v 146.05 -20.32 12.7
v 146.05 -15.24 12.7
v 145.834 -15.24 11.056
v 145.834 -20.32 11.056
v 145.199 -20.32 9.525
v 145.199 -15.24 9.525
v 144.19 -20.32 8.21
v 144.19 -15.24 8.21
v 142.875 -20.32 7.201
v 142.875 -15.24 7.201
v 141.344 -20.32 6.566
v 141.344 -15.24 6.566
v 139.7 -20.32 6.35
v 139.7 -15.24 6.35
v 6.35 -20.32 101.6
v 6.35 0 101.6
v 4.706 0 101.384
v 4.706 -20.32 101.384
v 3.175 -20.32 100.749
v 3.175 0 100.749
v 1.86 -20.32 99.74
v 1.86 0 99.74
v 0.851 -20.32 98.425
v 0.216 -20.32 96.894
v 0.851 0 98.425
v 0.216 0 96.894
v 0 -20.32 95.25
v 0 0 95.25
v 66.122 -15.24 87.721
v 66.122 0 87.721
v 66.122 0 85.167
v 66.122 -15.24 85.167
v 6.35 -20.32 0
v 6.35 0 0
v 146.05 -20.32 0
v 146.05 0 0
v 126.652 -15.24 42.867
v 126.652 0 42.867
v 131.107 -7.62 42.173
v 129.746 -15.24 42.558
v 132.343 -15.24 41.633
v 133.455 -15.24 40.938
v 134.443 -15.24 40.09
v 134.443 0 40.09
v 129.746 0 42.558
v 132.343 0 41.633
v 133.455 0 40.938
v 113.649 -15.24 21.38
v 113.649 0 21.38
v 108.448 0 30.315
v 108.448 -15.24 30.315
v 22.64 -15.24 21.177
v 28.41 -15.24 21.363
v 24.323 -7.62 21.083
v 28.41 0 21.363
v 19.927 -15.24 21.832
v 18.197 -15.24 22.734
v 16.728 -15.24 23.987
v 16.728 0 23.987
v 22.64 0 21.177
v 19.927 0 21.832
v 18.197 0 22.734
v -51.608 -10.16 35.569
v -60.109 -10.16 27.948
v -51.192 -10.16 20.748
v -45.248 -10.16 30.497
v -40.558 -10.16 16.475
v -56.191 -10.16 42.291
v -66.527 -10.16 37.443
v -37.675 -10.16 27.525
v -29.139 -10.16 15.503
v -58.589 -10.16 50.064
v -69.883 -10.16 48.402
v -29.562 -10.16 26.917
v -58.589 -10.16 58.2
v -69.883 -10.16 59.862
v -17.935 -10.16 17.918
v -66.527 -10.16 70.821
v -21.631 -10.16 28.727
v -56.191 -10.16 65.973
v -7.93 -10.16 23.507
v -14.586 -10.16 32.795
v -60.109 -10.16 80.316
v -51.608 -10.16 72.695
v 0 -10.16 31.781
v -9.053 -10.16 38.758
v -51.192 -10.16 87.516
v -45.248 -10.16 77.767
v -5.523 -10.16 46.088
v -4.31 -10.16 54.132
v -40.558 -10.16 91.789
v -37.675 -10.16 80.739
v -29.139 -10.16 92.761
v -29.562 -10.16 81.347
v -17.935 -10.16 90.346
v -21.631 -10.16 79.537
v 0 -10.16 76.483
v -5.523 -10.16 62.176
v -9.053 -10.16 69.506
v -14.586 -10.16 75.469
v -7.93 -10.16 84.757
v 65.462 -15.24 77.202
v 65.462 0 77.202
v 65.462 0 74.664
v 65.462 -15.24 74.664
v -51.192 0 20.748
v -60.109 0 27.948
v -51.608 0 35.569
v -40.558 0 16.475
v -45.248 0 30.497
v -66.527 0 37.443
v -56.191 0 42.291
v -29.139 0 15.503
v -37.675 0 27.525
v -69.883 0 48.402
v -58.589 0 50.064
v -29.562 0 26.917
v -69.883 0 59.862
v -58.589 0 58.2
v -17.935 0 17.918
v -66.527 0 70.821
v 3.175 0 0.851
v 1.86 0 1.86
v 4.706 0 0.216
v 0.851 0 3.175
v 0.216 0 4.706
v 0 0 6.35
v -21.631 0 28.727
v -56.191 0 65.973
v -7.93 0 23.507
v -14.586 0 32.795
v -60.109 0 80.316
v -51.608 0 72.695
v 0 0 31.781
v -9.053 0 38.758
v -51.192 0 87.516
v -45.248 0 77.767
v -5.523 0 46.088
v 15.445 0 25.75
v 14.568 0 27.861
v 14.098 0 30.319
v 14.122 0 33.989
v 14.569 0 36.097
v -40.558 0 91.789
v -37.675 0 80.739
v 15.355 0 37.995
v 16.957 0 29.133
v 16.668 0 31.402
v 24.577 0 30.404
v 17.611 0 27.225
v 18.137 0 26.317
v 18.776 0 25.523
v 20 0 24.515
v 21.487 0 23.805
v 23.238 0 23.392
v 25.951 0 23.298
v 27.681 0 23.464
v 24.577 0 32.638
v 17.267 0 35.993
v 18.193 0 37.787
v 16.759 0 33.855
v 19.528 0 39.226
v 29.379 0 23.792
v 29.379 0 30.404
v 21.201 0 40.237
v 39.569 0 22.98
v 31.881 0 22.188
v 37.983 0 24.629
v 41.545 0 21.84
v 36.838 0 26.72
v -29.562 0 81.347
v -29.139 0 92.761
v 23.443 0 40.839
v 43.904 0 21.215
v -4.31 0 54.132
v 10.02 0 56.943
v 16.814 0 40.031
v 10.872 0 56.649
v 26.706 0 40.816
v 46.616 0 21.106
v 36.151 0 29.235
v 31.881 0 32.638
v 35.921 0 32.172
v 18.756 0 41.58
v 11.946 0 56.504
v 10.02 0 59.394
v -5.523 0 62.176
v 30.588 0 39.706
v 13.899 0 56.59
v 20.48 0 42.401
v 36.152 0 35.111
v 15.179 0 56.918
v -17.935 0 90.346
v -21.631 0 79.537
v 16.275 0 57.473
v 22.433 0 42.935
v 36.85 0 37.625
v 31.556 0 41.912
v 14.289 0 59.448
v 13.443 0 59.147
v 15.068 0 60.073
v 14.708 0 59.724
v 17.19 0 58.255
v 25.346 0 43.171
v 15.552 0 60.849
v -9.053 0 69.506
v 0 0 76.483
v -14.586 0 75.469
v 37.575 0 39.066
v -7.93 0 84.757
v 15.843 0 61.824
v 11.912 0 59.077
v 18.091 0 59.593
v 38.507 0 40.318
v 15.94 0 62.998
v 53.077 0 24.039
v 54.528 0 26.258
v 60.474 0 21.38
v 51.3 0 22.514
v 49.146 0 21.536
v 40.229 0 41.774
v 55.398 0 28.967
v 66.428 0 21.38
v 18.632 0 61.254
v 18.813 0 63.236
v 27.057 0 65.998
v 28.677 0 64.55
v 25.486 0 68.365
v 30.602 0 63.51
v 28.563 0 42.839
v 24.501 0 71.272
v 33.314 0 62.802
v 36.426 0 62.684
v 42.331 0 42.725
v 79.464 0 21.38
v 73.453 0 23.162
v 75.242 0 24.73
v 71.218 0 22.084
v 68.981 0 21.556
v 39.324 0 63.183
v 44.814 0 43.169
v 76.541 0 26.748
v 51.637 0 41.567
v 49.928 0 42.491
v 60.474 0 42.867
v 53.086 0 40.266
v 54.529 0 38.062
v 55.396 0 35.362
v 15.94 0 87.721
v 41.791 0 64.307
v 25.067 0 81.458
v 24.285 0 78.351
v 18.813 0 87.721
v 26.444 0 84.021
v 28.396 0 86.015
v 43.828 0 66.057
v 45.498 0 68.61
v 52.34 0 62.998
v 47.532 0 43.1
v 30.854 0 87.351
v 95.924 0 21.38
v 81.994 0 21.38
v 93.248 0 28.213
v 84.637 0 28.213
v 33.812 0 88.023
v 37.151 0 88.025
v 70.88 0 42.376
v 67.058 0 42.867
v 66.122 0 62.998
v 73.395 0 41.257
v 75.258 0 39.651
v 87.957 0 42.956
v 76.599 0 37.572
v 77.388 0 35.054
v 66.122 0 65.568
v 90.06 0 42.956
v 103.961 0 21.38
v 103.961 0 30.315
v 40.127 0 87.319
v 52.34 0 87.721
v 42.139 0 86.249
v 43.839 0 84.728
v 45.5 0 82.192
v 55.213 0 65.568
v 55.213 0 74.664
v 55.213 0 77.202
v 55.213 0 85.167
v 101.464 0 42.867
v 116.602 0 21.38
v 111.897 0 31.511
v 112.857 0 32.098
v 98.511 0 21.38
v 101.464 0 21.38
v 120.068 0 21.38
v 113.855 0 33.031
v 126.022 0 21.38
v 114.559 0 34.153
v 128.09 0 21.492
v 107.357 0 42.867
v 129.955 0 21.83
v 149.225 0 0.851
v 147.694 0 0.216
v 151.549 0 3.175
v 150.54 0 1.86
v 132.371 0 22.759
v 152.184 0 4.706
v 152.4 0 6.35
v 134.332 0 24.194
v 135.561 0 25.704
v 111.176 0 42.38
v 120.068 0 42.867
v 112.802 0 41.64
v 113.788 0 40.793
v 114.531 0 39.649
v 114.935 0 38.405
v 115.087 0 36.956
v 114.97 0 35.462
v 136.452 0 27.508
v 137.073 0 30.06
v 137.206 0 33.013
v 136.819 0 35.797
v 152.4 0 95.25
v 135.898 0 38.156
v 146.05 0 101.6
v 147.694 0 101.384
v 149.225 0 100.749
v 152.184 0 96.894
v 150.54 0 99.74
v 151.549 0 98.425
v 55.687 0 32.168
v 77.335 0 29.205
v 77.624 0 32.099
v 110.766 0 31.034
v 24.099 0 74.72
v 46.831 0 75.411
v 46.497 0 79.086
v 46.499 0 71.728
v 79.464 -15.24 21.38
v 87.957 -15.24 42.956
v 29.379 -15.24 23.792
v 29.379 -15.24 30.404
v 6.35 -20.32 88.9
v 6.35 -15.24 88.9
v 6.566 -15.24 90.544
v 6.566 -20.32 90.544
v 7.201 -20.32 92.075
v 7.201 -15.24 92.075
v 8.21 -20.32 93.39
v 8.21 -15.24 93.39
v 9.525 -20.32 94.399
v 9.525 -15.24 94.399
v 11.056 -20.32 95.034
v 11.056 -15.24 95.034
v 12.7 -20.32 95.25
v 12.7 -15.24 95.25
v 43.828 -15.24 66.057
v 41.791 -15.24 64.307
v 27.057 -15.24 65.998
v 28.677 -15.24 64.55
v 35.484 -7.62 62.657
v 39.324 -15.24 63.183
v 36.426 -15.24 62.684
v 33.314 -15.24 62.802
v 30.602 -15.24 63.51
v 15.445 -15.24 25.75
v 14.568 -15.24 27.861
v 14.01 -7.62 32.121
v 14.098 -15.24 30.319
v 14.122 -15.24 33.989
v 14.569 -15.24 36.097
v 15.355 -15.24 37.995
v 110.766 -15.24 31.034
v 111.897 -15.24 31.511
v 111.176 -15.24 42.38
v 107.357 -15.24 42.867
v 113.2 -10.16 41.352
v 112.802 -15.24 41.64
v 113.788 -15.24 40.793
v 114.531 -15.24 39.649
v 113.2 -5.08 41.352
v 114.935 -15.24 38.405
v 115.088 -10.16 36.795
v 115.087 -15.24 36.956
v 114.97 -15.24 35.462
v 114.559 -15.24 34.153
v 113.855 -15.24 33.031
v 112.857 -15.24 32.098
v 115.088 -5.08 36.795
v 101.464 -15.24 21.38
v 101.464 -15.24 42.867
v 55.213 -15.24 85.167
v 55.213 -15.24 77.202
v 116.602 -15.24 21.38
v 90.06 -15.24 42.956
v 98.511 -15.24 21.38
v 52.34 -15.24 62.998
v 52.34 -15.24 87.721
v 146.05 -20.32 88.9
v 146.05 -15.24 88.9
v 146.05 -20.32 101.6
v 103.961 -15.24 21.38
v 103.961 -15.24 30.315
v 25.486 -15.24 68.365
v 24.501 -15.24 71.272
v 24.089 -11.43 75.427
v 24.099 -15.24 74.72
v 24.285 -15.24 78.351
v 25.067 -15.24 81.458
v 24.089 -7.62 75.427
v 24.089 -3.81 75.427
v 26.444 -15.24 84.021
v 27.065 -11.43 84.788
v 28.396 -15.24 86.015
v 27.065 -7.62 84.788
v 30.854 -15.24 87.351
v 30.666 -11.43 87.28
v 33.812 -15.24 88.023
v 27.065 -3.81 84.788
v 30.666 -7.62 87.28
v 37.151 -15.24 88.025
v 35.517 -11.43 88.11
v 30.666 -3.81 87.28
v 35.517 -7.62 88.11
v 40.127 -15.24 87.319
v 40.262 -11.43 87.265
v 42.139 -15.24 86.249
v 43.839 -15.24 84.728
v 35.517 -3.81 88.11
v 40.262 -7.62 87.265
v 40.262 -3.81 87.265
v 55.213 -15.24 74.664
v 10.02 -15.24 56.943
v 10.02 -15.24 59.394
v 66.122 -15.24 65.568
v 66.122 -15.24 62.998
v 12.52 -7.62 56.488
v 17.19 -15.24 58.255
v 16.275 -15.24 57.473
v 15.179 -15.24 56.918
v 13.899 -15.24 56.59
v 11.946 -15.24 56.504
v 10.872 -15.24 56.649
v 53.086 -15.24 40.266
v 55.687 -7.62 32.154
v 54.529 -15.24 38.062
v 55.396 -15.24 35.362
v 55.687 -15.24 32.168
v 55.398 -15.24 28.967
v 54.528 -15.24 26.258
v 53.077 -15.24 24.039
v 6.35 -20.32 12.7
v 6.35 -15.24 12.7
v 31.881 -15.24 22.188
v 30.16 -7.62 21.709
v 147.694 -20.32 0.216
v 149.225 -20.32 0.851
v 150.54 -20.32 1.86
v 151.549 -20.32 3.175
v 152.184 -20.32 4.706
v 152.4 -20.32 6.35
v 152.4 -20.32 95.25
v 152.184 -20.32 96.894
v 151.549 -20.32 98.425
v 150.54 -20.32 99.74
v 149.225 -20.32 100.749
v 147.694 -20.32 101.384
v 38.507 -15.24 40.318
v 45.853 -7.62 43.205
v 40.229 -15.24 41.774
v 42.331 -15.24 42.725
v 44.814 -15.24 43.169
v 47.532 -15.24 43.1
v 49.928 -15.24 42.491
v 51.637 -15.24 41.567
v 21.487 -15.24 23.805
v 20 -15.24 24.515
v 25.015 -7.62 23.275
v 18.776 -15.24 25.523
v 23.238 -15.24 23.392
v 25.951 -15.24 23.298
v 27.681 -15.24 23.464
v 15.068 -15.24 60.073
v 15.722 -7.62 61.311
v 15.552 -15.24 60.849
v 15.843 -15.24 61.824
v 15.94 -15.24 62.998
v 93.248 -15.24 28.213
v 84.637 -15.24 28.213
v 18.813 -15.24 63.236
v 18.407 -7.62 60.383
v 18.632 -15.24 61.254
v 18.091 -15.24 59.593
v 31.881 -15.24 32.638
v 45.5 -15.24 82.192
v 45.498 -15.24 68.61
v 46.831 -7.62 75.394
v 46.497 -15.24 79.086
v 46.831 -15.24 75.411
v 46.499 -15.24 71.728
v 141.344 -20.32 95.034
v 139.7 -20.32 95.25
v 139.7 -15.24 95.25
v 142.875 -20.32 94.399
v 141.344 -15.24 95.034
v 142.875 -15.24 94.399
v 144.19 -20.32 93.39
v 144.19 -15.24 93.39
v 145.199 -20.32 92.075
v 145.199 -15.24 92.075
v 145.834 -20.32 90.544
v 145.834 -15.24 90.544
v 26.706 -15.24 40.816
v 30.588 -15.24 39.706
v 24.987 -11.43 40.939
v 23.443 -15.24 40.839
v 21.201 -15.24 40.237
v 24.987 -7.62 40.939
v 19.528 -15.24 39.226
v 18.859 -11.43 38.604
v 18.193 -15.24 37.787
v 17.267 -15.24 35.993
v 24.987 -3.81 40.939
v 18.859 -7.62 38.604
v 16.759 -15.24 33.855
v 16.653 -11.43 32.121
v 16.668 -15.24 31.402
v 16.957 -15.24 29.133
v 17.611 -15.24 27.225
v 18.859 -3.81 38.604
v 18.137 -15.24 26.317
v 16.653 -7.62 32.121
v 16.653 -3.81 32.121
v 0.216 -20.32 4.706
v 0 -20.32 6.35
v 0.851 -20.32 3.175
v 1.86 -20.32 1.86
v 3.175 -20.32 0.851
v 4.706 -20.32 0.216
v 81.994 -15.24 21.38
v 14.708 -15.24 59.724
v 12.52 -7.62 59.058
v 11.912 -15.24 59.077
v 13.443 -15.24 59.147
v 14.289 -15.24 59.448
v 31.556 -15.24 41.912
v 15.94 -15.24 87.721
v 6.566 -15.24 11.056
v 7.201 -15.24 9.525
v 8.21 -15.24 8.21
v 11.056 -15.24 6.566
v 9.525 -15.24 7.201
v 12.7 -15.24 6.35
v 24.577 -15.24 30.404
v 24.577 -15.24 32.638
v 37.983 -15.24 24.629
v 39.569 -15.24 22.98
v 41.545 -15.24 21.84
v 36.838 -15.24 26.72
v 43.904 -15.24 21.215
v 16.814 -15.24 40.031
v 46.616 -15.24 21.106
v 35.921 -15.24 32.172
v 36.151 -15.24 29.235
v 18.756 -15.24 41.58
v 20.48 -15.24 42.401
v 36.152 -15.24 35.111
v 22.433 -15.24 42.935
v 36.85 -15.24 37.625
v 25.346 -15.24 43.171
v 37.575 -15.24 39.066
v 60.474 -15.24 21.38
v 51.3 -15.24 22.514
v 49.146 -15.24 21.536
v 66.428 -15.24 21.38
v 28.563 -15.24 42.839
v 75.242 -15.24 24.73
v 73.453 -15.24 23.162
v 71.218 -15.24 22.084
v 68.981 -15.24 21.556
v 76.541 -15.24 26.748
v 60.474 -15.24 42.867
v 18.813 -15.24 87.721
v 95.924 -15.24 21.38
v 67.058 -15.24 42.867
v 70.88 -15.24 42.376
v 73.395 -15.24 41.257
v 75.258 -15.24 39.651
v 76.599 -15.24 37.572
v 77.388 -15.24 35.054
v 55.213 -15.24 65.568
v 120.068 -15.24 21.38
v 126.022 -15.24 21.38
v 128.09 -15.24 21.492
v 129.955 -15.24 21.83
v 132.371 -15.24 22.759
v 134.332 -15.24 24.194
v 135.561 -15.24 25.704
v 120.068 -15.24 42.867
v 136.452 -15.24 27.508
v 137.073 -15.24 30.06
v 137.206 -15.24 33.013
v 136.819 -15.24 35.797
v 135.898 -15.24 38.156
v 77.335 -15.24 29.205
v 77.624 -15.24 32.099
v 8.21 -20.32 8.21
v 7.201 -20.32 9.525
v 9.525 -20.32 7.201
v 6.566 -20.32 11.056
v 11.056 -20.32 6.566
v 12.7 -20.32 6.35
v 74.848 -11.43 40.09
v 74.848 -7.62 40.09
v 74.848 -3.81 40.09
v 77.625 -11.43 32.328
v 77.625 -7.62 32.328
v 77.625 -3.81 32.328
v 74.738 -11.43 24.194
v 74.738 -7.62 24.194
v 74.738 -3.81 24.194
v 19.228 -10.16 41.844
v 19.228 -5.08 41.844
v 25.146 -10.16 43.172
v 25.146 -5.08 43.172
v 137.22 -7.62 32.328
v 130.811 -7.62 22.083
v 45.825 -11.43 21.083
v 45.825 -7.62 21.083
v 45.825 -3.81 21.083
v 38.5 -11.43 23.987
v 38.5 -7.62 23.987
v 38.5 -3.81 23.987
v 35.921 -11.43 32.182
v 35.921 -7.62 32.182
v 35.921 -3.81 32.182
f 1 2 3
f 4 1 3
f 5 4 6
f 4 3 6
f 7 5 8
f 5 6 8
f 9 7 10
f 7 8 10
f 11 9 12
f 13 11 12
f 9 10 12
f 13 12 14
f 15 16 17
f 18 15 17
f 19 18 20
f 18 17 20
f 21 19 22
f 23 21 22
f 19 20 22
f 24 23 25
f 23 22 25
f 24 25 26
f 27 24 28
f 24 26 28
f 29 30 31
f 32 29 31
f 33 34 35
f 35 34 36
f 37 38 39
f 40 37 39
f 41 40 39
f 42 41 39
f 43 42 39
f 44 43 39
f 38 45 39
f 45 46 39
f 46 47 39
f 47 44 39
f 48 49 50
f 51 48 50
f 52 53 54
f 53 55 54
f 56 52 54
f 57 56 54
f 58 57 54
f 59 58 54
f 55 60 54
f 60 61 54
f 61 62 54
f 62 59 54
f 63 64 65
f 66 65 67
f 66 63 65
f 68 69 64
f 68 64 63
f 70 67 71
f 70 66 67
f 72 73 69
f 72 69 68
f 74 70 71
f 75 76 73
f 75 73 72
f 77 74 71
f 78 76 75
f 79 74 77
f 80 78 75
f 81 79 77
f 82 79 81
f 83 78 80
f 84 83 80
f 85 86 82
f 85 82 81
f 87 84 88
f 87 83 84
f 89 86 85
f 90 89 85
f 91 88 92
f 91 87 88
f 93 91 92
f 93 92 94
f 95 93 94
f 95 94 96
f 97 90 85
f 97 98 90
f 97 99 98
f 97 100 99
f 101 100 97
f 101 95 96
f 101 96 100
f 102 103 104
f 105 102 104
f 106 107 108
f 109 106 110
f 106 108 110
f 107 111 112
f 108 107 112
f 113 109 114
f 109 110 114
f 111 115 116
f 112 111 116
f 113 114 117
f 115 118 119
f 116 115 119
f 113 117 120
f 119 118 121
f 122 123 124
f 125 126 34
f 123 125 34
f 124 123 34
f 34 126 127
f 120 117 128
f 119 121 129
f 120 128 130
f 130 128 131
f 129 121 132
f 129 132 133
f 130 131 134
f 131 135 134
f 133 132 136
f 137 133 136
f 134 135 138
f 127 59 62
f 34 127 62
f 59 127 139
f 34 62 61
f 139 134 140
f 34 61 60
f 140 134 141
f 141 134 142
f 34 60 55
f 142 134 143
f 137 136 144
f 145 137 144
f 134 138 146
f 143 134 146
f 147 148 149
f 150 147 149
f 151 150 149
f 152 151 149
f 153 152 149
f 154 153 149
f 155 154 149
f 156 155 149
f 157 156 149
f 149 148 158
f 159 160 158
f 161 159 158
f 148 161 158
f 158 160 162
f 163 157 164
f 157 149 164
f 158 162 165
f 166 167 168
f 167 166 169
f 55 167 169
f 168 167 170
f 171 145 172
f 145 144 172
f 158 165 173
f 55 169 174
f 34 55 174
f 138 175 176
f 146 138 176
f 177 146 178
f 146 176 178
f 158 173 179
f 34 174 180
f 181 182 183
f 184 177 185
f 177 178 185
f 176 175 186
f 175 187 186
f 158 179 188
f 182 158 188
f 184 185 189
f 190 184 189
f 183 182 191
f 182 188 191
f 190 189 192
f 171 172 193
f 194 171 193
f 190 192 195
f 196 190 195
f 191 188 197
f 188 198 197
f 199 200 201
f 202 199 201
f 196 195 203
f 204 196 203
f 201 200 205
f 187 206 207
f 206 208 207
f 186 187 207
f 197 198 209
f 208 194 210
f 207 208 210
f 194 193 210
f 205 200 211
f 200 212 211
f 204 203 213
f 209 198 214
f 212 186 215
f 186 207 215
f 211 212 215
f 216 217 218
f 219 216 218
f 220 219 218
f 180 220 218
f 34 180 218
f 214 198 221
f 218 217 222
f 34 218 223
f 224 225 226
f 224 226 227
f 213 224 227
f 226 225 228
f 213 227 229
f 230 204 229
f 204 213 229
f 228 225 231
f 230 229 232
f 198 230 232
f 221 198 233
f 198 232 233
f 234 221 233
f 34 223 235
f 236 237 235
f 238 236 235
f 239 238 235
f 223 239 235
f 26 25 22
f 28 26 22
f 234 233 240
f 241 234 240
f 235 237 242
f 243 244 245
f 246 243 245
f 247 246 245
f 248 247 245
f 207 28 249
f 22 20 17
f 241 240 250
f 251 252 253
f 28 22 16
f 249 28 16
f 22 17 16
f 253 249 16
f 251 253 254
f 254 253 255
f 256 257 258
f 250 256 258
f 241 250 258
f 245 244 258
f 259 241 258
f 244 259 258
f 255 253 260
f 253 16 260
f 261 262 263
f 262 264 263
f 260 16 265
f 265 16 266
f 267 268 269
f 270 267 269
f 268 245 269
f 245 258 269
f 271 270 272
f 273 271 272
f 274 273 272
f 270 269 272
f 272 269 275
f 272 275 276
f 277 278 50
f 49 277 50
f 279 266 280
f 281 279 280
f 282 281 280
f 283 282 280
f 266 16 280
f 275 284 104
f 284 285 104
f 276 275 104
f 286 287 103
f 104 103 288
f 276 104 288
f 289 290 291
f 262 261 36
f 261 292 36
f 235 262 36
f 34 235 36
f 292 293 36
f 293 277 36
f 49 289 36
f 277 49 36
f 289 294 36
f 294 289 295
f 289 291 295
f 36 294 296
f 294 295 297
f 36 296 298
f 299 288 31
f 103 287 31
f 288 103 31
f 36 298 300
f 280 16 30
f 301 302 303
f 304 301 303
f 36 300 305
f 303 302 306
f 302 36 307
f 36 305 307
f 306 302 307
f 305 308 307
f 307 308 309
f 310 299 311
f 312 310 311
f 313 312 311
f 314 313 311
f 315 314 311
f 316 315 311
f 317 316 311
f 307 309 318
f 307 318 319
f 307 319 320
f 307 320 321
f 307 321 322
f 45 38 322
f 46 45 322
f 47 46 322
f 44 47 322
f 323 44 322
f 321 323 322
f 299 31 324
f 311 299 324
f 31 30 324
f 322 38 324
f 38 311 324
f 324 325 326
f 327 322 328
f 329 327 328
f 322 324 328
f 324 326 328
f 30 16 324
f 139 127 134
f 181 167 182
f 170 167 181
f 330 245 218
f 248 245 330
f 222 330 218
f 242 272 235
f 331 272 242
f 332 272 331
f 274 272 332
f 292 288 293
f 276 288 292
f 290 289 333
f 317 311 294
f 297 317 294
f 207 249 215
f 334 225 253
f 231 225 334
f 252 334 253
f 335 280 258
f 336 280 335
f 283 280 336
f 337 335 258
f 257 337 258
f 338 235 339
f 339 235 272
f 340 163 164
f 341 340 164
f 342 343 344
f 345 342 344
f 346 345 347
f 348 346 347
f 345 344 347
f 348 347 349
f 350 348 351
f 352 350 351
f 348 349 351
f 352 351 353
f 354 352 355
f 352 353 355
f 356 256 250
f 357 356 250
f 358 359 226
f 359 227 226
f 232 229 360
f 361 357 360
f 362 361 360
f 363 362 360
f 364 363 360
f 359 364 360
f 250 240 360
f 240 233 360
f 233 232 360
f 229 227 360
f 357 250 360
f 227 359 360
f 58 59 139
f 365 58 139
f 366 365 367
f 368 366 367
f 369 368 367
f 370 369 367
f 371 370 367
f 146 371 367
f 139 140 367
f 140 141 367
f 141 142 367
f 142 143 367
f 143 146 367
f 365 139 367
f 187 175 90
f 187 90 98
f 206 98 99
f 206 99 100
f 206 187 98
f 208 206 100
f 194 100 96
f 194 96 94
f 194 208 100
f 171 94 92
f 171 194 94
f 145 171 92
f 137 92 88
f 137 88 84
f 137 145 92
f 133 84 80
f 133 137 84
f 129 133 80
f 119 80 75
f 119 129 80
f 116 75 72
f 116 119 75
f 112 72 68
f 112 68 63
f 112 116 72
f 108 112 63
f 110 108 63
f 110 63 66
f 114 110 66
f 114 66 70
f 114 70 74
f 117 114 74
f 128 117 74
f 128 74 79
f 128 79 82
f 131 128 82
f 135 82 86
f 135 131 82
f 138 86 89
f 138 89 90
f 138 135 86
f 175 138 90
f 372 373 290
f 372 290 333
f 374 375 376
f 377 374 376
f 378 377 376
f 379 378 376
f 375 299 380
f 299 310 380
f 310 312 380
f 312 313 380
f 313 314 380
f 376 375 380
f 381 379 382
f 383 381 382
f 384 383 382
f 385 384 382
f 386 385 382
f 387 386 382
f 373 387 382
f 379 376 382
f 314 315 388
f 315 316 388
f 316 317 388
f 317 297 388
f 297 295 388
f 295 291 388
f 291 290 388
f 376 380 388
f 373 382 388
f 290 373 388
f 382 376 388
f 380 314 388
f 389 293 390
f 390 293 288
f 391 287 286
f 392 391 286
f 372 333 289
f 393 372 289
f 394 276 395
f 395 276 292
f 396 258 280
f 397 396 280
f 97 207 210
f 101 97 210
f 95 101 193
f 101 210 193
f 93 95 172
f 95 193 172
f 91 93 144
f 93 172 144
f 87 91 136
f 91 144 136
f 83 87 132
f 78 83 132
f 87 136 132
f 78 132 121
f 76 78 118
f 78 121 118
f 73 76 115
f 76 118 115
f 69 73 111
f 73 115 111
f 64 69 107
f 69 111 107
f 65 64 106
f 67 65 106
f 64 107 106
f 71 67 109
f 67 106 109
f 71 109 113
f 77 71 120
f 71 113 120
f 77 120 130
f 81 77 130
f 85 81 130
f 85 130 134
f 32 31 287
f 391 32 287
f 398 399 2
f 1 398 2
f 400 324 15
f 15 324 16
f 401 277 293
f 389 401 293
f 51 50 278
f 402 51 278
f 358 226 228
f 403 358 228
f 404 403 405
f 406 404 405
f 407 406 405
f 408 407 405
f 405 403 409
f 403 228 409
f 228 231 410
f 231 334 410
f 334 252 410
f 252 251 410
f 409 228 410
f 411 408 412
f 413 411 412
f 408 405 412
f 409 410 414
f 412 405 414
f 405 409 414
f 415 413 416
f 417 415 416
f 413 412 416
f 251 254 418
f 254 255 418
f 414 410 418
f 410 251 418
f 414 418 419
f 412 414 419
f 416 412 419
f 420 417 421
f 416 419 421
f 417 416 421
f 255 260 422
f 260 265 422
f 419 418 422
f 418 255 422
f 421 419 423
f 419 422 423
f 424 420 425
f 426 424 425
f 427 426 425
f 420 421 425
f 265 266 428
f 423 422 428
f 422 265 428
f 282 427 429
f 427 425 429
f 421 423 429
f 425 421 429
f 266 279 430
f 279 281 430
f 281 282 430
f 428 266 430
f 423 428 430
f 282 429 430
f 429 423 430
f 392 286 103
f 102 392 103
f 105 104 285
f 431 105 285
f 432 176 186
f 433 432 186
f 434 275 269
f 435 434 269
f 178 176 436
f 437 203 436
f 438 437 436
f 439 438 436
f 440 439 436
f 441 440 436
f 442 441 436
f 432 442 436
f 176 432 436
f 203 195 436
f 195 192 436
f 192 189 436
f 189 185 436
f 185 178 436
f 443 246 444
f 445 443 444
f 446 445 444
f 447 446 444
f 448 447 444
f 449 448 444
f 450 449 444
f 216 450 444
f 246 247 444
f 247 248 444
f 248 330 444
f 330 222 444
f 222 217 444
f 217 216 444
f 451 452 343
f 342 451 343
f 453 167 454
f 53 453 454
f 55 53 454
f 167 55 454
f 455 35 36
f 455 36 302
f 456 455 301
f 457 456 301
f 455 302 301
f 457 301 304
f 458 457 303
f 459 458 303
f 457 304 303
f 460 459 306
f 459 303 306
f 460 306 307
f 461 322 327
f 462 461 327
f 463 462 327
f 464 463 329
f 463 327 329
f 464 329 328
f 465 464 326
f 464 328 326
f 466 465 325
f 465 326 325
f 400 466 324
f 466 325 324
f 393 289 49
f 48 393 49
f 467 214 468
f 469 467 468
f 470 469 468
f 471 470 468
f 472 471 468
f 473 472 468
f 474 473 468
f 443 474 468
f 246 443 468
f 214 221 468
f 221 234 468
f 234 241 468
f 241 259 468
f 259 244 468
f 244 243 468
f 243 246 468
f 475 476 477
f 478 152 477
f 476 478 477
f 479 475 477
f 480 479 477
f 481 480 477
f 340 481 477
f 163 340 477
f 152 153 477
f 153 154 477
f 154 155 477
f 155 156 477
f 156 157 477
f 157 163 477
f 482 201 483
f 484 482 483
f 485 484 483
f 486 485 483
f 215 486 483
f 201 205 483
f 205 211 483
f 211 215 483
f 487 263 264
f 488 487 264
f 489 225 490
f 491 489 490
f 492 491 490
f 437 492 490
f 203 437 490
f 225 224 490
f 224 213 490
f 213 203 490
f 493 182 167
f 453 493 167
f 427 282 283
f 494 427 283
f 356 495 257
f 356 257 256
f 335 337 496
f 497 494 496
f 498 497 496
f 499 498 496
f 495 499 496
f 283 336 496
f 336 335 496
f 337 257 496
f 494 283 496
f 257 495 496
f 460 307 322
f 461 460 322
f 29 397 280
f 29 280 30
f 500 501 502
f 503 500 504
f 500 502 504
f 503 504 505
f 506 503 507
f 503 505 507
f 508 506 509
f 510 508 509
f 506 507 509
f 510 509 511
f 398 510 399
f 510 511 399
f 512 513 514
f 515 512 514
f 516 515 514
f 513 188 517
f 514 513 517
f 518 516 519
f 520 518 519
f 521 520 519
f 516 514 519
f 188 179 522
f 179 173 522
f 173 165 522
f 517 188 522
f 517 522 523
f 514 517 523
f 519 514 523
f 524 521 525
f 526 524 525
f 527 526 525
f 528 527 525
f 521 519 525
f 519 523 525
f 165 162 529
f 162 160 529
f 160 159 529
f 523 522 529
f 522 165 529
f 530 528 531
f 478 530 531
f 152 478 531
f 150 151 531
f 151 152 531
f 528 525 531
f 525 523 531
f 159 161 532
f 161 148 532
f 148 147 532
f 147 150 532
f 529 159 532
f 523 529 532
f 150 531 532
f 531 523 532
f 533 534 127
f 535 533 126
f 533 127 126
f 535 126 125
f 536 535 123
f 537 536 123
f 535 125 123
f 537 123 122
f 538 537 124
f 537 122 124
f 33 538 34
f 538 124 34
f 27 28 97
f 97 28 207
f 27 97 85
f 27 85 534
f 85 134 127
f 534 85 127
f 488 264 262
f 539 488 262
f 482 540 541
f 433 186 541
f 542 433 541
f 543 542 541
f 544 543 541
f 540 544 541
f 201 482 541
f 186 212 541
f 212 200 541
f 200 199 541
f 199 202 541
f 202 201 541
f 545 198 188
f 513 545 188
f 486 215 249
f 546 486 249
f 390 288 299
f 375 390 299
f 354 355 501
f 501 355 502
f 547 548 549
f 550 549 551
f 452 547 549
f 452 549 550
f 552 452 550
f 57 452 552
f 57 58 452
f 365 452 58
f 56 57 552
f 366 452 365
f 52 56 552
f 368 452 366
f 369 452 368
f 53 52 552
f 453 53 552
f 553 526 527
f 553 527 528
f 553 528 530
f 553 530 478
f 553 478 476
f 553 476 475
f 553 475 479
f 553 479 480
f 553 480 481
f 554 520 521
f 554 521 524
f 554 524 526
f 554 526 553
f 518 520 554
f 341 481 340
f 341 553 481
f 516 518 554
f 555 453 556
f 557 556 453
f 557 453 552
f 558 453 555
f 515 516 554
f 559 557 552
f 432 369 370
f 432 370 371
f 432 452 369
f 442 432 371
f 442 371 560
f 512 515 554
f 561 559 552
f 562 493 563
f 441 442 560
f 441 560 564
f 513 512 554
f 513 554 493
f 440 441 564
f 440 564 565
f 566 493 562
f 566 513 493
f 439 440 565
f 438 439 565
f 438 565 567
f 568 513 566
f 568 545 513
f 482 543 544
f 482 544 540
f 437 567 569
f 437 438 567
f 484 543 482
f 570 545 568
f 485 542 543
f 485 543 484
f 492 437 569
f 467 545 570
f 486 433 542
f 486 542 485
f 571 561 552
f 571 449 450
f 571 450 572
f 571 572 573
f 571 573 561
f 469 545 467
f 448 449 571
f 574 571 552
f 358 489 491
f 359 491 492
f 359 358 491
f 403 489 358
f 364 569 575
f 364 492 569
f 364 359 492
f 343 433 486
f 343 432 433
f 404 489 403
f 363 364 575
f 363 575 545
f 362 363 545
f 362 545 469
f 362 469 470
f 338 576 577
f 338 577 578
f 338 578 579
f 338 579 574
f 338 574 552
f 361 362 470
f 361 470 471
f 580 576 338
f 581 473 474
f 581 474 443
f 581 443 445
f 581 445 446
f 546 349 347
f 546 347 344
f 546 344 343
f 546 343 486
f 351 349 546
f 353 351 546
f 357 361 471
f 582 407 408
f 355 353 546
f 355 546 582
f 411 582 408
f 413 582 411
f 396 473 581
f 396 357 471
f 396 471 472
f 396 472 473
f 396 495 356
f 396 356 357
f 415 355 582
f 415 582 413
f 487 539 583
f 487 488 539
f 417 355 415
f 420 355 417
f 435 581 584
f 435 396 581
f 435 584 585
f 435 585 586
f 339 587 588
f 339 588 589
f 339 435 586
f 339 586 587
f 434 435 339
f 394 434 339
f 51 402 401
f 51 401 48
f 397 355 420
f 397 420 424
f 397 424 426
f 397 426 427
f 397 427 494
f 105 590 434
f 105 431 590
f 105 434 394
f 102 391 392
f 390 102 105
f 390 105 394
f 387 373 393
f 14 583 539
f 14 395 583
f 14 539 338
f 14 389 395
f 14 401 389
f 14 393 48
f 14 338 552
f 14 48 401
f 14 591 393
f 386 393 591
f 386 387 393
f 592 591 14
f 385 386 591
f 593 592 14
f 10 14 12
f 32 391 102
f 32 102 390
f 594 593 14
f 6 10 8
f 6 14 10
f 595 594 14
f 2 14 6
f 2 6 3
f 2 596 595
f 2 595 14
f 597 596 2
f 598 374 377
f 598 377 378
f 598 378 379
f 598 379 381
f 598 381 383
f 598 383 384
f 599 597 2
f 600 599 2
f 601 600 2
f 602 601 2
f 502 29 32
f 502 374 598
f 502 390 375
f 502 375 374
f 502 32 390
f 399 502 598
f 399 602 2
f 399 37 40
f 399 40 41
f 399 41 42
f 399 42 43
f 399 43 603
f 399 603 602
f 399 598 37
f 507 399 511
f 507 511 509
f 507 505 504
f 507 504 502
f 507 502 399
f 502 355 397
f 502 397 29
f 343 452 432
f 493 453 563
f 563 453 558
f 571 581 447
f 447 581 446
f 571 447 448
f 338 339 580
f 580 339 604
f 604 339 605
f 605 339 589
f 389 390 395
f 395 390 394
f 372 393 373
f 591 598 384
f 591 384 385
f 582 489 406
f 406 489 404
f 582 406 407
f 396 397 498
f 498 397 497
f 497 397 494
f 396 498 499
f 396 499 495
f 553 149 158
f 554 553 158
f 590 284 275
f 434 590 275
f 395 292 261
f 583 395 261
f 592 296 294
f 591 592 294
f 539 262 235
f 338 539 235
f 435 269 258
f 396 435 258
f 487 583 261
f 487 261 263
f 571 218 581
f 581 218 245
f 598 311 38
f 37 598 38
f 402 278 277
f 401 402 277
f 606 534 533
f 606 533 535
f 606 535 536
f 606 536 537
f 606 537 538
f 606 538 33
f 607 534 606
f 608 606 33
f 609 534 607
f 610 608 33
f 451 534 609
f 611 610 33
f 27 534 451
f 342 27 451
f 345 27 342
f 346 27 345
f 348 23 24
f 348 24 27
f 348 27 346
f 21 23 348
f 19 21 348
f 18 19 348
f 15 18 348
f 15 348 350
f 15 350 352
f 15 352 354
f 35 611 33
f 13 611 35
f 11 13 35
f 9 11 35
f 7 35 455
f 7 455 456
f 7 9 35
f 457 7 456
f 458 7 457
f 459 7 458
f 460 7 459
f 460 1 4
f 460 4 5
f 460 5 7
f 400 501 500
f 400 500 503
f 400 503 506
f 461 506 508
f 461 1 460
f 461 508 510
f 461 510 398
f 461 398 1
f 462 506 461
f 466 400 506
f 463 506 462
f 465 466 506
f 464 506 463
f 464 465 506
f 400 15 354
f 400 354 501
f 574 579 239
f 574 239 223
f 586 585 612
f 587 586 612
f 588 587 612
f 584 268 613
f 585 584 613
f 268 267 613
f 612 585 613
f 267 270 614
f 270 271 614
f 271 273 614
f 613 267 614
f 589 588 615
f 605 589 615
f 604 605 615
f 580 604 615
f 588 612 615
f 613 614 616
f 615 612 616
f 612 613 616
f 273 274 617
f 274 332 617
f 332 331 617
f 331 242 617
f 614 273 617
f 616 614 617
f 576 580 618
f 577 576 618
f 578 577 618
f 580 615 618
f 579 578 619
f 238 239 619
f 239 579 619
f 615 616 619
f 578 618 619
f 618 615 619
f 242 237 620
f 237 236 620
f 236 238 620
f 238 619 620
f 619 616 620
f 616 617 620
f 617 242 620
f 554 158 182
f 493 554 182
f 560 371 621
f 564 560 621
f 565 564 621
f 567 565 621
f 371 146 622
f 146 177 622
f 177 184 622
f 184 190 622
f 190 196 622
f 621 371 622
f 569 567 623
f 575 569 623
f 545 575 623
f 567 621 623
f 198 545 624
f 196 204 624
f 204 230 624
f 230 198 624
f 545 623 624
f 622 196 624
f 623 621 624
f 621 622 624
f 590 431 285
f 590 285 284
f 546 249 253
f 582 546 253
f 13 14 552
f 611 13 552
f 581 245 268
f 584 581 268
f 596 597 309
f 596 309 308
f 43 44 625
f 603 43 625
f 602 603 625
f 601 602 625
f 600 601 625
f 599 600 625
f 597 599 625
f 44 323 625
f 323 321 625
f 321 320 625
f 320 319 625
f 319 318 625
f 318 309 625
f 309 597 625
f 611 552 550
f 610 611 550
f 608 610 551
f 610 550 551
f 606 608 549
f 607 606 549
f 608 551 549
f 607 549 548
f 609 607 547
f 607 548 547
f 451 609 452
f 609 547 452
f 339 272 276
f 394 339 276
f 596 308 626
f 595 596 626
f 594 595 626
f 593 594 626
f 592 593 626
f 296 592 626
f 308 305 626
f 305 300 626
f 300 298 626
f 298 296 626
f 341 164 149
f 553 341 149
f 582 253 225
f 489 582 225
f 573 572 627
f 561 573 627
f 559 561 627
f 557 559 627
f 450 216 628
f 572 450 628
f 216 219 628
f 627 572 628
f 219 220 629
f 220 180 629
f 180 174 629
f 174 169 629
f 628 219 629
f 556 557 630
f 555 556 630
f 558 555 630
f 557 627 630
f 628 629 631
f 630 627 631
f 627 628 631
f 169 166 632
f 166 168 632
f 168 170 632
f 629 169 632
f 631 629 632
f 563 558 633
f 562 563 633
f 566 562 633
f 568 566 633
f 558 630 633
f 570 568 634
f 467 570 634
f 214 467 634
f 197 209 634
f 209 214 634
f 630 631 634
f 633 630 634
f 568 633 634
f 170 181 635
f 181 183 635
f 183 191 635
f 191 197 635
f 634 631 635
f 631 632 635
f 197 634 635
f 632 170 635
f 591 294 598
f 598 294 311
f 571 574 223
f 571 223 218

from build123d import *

# Parameters (mm, degrees)
F1_DEPTH = 20.32
F2_DEPTH = 15.24
F0_R     = 27.2915133995
F3_DEPTH = 10.16


with BuildPart() as f1:
    # F0 (on Front) → F1 (new body)
    with BuildSketch(Plane.XZ):
        with BuildLine():
            ThreePointArc((0, 6.35), (1.8598719395, 1.8598719395), (6.35, 0))
            Line((6.35, 0), (146.05, 0))
            ThreePointArc((146.05, 0), (150.5401280605, 1.8598719395), (152.4, 6.35))
            Line((152.4, 6.35), (152.4, 95.25))
            ThreePointArc((152.4, 95.25), (150.5401280605, 99.7401280605), (146.05, 101.6))
            Line((146.05, 101.6), (6.35, 101.6))
            ThreePointArc((6.35, 101.6), (1.8598719395, 99.7401280605), (0, 95.25))
            Line((0, 95.25), (0, 76.4830120565))
            Line((0, 76.4830120565), (0, 31.7811063765))
            Line((0, 31.7811063765), (0, 6.35))
        make_face()
        with BuildLine():
            ThreePointArc((6.35, 88.9), (8.2098719395, 93.3901280605), (12.7, 95.25))
            Line((12.7, 95.25), (139.7, 95.25))
            ThreePointArc((139.7, 95.25), (144.1901280605, 93.3901280605), (146.05, 88.9))
            Line((146.05, 88.9), (146.05, 12.7))
            ThreePointArc((146.05, 12.7), (144.1901280605, 8.2098719395), (139.7, 6.35))
            Line((139.7, 6.35), (12.7, 6.35))
            ThreePointArc((12.7, 6.35), (8.2098719395, 8.2098719395), (6.35, 12.7))
            Line((6.35, 12.7), (6.35, 88.9))
        make_face(mode=Mode.SUBTRACT)
    extrude(amount=F1_DEPTH)

    # F0 (on Front) → F2 (join)
    with BuildSketch(Plane.XZ):
        with BuildLine():
            Line((139.7, 95.25), (12.7, 95.25))
            ThreePointArc((12.7, 95.25), (8.2098719395, 93.3901280605), (6.35, 88.9))
            Line((6.35, 88.9), (6.35, 12.7))
            ThreePointArc((6.35, 12.7), (8.2098719395, 8.2098719395), (12.7, 6.35))
            Line((12.7, 6.35), (139.7, 6.35))
            ThreePointArc((139.7, 6.35), (144.1901280605, 8.2098719395), (146.05, 12.7))
            Line((146.05, 12.7), (146.05, 88.9))
            ThreePointArc((146.05, 88.9), (144.1901280605, 93.3901280605), (139.7, 95.25))
        make_face()
        with BuildLine():
            Line((24.5773977576, 30.4042935003), (24.5773977576, 32.6381390844))
            Line((24.5773977576, 32.6381390844), (31.8808971096, 32.6381390844))
            Line((31.8808971096, 32.6381390844), (31.8808971096, 22.1884445834))
            add(Edge.make_bspline(
                [(31.8808971096, 22.1884445834), (30.1737688, 21.6429159776), (28.4102064967, 21.3630974255)],
                knots=[0, 0, 0, 1, 1, 1], degree=2))
            add(Edge.make_bspline(
                [(28.4102064967, 21.3630974255), (26.6466441934, 21.0832788733), (24.3234447859, 21.0832788733)],
                knots=[0, 0, 0, 1, 1, 1], degree=2))
            add(Edge.make_bspline(
                [(24.3234447859, 21.0832788733), (19.4466071633, 21.0832788733), (16.7283697998, 23.9872781327)],
                knots=[0, 0, 0, 1, 1, 1], degree=2))
            add(Edge.make_bspline(
                [(16.7283697998, 23.9872781327), (14.0101324364, 26.8912773921), (14.0101324364, 32.1208274754)],
                knots=[0, 0, 0, 1, 1, 1], degree=2))
            add(Edge.make_bspline(
                [(14.0101324364, 32.1208274754), (14.0101324364, 35.4739472681), (15.3551426197, 37.9946656536)],
                knots=[0, 0, 0, 1, 1, 1], degree=2))
            add(Edge.make_bspline(
                [(15.3551426197, 37.9946656536), (16.700152803, 40.515384039), (19.2279254377, 41.8439343075)],
                knots=[0, 0, 0, 1, 1, 1], degree=2))
            add(Edge.make_bspline(
                [(19.2279254377, 41.8439343075), (21.7556980724, 43.172484576), (25.1464405275, 43.172484576)],
                knots=[0, 0, 0, 1, 1, 1], degree=2))
            add(Edge.make_bspline(
                [(25.1464405275, 43.172484576), (28.5889141435, 43.172484576), (31.5564016458, 41.9121253832)],
                knots=[0, 0, 0, 1, 1, 1], degree=2))
            Line((31.5564016458, 41.9121253832), (30.5876180872, 39.7064967959))
            add(Edge.make_bspline(
                [(30.5876180872, 39.7064967959), (27.6765645786, 40.9386389918), (24.986544212, 40.9386389918)],
                knots=[0, 0, 0, 1, 1, 1], degree=2))
            add(Edge.make_bspline(
                [(24.986544212, 40.9386389918), (21.0643816495, 40.9386389918), (18.8587530622, 38.6036825023)],
                knots=[0, 0, 0, 1, 1, 1], degree=2))
            add(Edge.make_bspline(
                [(18.8587530622, 38.6036825023), (16.6531244749, 36.2687260128), (16.6531244749, 32.1208274754)],
                knots=[0, 0, 0, 1, 1, 1], degree=2))
            add(Edge.make_bspline(
                [(16.6531244749, 32.1208274754), (16.6531244749, 27.7707071274), (18.776453488, 25.5227530448)],
                knots=[0, 0, 0, 1, 1, 1], degree=2))
            add(Edge.make_bspline(
                [(18.776453488, 25.5227530448), (20.8997825012, 23.2747989622), (25.0147612088, 23.2747989622)],
                knots=[0, 0, 0, 1, 1, 1], degree=2))
            add(Edge.make_bspline(
                [(25.0147612088, 23.2747989622), (27.248606793, 23.2747989622), (29.3789900553, 23.7921105712)],
                knots=[0, 0, 0, 1, 1, 1], degree=2))
            Line((29.3789900553, 23.7921105712), (29.3789900553, 30.4042935003))
            Line((29.3789900553, 30.4042935003), (24.5773977576, 30.4042935003))
        make_face(mode=Mode.SUBTRACT)
        with BuildLine():
            add(Edge.make_bspline(
                [(53.0859702442, 40.2661339002), (55.6866367874, 37.3268633947), (55.6866367874, 32.1537473051)],
                knots=[0, 0, 0, 1, 1, 1], degree=2))
            add(Edge.make_bspline(
                [(55.6866367874, 32.1537473051), (55.6866367874, 26.9947397139), (53.0765645786, 24.0390092936)],
                knots=[0, 0, 0, 1, 1, 1], degree=2))
            add(Edge.make_bspline(
                [(53.0765645786, 24.0390092936), (50.4664923697, 21.0832788733), (45.8247963875, 21.0832788733)],
                knots=[0, 0, 0, 1, 1, 1], degree=2))
            add(Edge.make_bspline(
                [(45.8247963875, 21.0832788733), (41.0796380835, 21.0832788733), (38.5001342879, 23.9872781327)],
                knots=[0, 0, 0, 1, 1, 1], degree=2))
            add(Edge.make_bspline(
                [(38.5001342879, 23.9872781327), (35.9206304923, 26.8912773921), (35.9206304923, 32.181964302)],
                knots=[0, 0, 0, 1, 1, 1], degree=2))
            add(Edge.make_bspline(
                [(35.9206304923, 32.181964302), (35.9206304923, 37.4303257165), (38.5071885371, 40.3178650611)],
                knots=[0, 0, 0, 1, 1, 1], degree=2))
            add(Edge.make_bspline(
                [(38.5071885371, 40.3178650611), (41.0937465819, 43.2054044056), (45.8530133843, 43.2054044056)],
                knots=[0, 0, 0, 1, 1, 1], degree=2))
            add(Edge.make_bspline(
                [(45.8530133843, 43.2054044056), (50.4853037009, 43.2054044056), (53.0859702442, 40.2661339002)],
                knots=[0, 0, 0, 1, 1, 1], degree=2))
        make_face(mode=Mode.SUBTRACT)
        with BuildLine():
            add(Edge.make_bspline(
                [(74.8483290666, 40.0897776699), (77.6253518402, 37.3127548963), (77.6253518402, 32.327752119)],
                knots=[0, 0, 0, 1, 1, 1], degree=2))
            add(Edge.make_bspline(
                [(77.6253518402, 32.327752119), (77.6253518402, 27.0088482123), (74.7378124956, 24.1942027763)],
                knots=[0, 0, 0, 1, 1, 1], degree=2))
            add(Edge.make_bspline(
                [(74.7378124956, 24.1942027763), (71.850273151, 21.3795573403), (66.4279069226, 21.3795573403)],
                knots=[0, 0, 0, 1, 1, 1], degree=2))
            Line((66.4279069226, 21.3795573403), (60.4741205867, 21.3795573403))
            Line((60.4741205867, 21.3795573403), (60.4741205867, 42.8668004434))
            Line((60.4741205867, 42.8668004434), (67.0580865189, 42.8668004434))
            add(Edge.make_bspline(
                [(67.0580865189, 42.8668004434), (72.0713062931, 42.8668004434), (74.8483290666, 40.0897776699)],
                knots=[0, 0, 0, 1, 1, 1], degree=2))
        make_face(mode=Mode.SUBTRACT)
        Polygon((98.5106323438, 21.3795573403), (95.924074299, 21.3795573403), (93.2481624308, 28.2127734114), (84.637275558, 28.2127734114), (81.9942835195, 21.3795573403), (79.4641594684, 21.3795573403), (87.957475521, 42.9561542668), (90.0596417865, 42.9561542668), align=None, mode=Mode.SUBTRACT)
        with BuildLine():
            Line((108.4477180687, 30.3149396769), (103.9612155691, 30.3149396769))
            Line((103.9612155691, 30.3149396769), (103.9612155691, 21.3795573403))
            Line((103.9612155691, 21.3795573403), (101.4640113477, 21.3795573403))
            Line((101.4640113477, 21.3795573403), (101.4640113477, 42.8668004434))
            Line((101.4640113477, 42.8668004434), (107.356660857, 42.8668004434))
            add(Edge.make_bspline(
                [(107.356660857, 42.8668004434), (111.3117432492, 42.8668004434), (113.1999306219, 41.352488279)],
                knots=[0, 0, 0, 1, 1, 1], degree=2))
            add(Edge.make_bspline(
                [(113.1999306219, 41.352488279), (115.0881179946, 39.8381761146), (115.0881179946, 36.7954432873)],
                knots=[0, 0, 0, 1, 1, 1], degree=2))
            add(Edge.make_bspline(
                [(115.0881179946, 36.7954432873), (115.0881179946, 32.5346767626), (110.7662146434, 31.0344730966)],
                knots=[0, 0, 0, 1, 1, 1], degree=2))
            Line((110.7662146434, 31.0344730966), (116.602430159, 21.3795573403))
            Line((116.602430159, 21.3795573403), (113.6490511551, 21.3795573403))
            Line((113.6490511551, 21.3795573403), (108.4477180687, 30.3149396769))
        make_face(mode=Mode.SUBTRACT)
        with BuildLine():
            add(Edge.make_bspline(
                [(134.442626419, 40.0897776699), (137.2196491925, 37.3127548963), (137.2196491925, 32.327752119)],
                knots=[0, 0, 0, 1, 1, 1], degree=2))
            add(Edge.make_bspline(
                [(137.2196491925, 32.327752119), (137.2196491925, 27.0088482123), (134.332109848, 24.1942027763)],
                knots=[0, 0, 0, 1, 1, 1], degree=2))
            add(Edge.make_bspline(
                [(134.332109848, 24.1942027763), (131.4445705034, 21.3795573403), (126.0222042749, 21.3795573403)],
                knots=[0, 0, 0, 1, 1, 1], degree=2))
            Line((126.0222042749, 21.3795573403), (120.0684179391, 21.3795573403))
            Line((120.0684179391, 21.3795573403), (120.0684179391, 42.8668004434))
            Line((120.0684179391, 42.8668004434), (126.6523838713, 42.8668004434))
            add(Edge.make_bspline(
                [(126.6523838713, 42.8668004434), (131.6656036454, 42.8668004434), (134.442626419, 40.0897776699)],
                knots=[0, 0, 0, 1, 1, 1], degree=2))
        make_face(mode=Mode.SUBTRACT)
        with BuildLine():
            add(Edge.make_bspline(
                [(17.1895407936, 58.2547495158), (15.5662232331, 56.4880389041), (12.5197972779, 56.4880389041)],
                knots=[0, 0, 0, 1, 1, 1], degree=2))
            add(Edge.make_bspline(
                [(12.5197972779, 56.4880389041), (10.9343571271, 56.4880389041), (10.0198882347, 56.942567821)],
                knots=[0, 0, 0, 1, 1, 1], degree=2))
            Line((10.0198882347, 56.942567821), (10.0198882347, 59.3937773374))
            add(Edge.make_bspline(
                [(10.0198882347, 59.3937773374), (11.2211432295, 59.0582917082), (12.5197972779, 59.0582917082)],
                knots=[0, 0, 0, 1, 1, 1], degree=2))
            add(Edge.make_bspline(
                [(12.5197972779, 59.0582917082), (14.1972254237, 59.0582917082), (15.0684058479, 60.0728651835)],
                knots=[0, 0, 0, 1, 1, 1], degree=2))
            add(Edge.make_bspline(
                [(15.0684058479, 60.0728651835), (15.939586272, 61.0874386588), (15.939586272, 62.9975423217)],
                knots=[0, 0, 0, 1, 1, 1], degree=2))
            Line((15.939586272, 62.9975423217), (15.939586272, 87.720668768))
            Line((15.939586272, 87.720668768), (18.8128583541, 87.720668768))
            Line((18.8128583541, 87.720668768), (18.8128583541, 63.2356288972))
            add(Edge.make_bspline(
                [(18.8128583541, 63.2356288972), (18.8128583541, 60.0214601274), (17.1895407936, 58.2547495158)],
                knots=[0, 0, 0, 1, 1, 1], degree=2))
        make_face(mode=Mode.SUBTRACT)
        with BuildLine():
            add(Edge.make_bspline(
                [(43.8390040783, 84.7283533981), (46.8313194482, 81.3464418138), (46.8313194482, 75.3942774253)],
                knots=[0, 0, 0, 1, 1, 1], degree=2))
            add(Edge.make_bspline(
                [(46.8313194482, 75.3942774253), (46.8313194482, 69.4583462124), (43.8281819612, 66.0574959232)],
                knots=[0, 0, 0, 1, 1, 1], degree=2))
            add(Edge.make_bspline(
                [(43.8281819612, 66.0574959232), (40.8250444743, 62.656645634), (35.4843297003, 62.656645634)],
                knots=[0, 0, 0, 1, 1, 1], degree=2))
            add(Edge.make_bspline(
                [(35.4843297003, 62.656645634), (30.0245716385, 62.656645634), (27.0566060321, 65.9979742793)],
                knots=[0, 0, 0, 1, 1, 1], degree=2))
            add(Edge.make_bspline(
                [(27.0566060321, 65.9979742793), (24.0886404257, 69.3393029247), (24.0886404257, 75.4267437765)],
                knots=[0, 0, 0, 1, 1, 1], degree=2))
            add(Edge.make_bspline(
                [(24.0886404257, 75.4267437765), (24.0886404257, 81.4654851015), (27.0647226199, 84.787875042)],
                knots=[0, 0, 0, 1, 1, 1], degree=2))
            add(Edge.make_bspline(
                [(27.0647226199, 84.787875042), (30.0408048141, 88.1102649825), (35.5167960515, 88.1102649825)],
                knots=[0, 0, 0, 1, 1, 1], degree=2))
            add(Edge.make_bspline(
                [(35.5167960515, 88.1102649825), (40.8466887085, 88.1102649825), (43.8390040783, 84.7283533981)],
                knots=[0, 0, 0, 1, 1, 1], degree=2))
        make_face(mode=Mode.SUBTRACT)
        Polygon((66.1217431253, 65.5677951258), (66.1217431253, 62.9975423217), (52.3397770368, 62.9975423217), (52.3397770368, 87.720668768), (66.1217431253, 87.720668768), (66.1217431253, 85.1666491395), (55.2130491188, 85.1666491395), (55.2130491188, 77.201570976), (65.4615939841, 77.201570976), (65.4615939841, 74.6637845231), (55.2130491188, 74.6637845231), (55.2130491188, 65.5677951258), align=None, mode=Mode.SUBTRACT)
    extrude(amount=F2_DEPTH)

    # F0 (on Front) → F3 (join)
    with BuildSketch(Plane.XZ):
        with BuildLine():
            ThreePointArc((0, 76.4830120565), (-70.3092045361, 54.1320592165), (0, 31.7811063765))
            Line((0, 31.7811063765), (0, 76.4830120565))
        make_face()
        with Locations((-31.601972878, 54.1320592165)):
            Circle(F0_R, mode=Mode.SUBTRACT)
    extrude(amount=F3_DEPTH)


solid = f1.part
